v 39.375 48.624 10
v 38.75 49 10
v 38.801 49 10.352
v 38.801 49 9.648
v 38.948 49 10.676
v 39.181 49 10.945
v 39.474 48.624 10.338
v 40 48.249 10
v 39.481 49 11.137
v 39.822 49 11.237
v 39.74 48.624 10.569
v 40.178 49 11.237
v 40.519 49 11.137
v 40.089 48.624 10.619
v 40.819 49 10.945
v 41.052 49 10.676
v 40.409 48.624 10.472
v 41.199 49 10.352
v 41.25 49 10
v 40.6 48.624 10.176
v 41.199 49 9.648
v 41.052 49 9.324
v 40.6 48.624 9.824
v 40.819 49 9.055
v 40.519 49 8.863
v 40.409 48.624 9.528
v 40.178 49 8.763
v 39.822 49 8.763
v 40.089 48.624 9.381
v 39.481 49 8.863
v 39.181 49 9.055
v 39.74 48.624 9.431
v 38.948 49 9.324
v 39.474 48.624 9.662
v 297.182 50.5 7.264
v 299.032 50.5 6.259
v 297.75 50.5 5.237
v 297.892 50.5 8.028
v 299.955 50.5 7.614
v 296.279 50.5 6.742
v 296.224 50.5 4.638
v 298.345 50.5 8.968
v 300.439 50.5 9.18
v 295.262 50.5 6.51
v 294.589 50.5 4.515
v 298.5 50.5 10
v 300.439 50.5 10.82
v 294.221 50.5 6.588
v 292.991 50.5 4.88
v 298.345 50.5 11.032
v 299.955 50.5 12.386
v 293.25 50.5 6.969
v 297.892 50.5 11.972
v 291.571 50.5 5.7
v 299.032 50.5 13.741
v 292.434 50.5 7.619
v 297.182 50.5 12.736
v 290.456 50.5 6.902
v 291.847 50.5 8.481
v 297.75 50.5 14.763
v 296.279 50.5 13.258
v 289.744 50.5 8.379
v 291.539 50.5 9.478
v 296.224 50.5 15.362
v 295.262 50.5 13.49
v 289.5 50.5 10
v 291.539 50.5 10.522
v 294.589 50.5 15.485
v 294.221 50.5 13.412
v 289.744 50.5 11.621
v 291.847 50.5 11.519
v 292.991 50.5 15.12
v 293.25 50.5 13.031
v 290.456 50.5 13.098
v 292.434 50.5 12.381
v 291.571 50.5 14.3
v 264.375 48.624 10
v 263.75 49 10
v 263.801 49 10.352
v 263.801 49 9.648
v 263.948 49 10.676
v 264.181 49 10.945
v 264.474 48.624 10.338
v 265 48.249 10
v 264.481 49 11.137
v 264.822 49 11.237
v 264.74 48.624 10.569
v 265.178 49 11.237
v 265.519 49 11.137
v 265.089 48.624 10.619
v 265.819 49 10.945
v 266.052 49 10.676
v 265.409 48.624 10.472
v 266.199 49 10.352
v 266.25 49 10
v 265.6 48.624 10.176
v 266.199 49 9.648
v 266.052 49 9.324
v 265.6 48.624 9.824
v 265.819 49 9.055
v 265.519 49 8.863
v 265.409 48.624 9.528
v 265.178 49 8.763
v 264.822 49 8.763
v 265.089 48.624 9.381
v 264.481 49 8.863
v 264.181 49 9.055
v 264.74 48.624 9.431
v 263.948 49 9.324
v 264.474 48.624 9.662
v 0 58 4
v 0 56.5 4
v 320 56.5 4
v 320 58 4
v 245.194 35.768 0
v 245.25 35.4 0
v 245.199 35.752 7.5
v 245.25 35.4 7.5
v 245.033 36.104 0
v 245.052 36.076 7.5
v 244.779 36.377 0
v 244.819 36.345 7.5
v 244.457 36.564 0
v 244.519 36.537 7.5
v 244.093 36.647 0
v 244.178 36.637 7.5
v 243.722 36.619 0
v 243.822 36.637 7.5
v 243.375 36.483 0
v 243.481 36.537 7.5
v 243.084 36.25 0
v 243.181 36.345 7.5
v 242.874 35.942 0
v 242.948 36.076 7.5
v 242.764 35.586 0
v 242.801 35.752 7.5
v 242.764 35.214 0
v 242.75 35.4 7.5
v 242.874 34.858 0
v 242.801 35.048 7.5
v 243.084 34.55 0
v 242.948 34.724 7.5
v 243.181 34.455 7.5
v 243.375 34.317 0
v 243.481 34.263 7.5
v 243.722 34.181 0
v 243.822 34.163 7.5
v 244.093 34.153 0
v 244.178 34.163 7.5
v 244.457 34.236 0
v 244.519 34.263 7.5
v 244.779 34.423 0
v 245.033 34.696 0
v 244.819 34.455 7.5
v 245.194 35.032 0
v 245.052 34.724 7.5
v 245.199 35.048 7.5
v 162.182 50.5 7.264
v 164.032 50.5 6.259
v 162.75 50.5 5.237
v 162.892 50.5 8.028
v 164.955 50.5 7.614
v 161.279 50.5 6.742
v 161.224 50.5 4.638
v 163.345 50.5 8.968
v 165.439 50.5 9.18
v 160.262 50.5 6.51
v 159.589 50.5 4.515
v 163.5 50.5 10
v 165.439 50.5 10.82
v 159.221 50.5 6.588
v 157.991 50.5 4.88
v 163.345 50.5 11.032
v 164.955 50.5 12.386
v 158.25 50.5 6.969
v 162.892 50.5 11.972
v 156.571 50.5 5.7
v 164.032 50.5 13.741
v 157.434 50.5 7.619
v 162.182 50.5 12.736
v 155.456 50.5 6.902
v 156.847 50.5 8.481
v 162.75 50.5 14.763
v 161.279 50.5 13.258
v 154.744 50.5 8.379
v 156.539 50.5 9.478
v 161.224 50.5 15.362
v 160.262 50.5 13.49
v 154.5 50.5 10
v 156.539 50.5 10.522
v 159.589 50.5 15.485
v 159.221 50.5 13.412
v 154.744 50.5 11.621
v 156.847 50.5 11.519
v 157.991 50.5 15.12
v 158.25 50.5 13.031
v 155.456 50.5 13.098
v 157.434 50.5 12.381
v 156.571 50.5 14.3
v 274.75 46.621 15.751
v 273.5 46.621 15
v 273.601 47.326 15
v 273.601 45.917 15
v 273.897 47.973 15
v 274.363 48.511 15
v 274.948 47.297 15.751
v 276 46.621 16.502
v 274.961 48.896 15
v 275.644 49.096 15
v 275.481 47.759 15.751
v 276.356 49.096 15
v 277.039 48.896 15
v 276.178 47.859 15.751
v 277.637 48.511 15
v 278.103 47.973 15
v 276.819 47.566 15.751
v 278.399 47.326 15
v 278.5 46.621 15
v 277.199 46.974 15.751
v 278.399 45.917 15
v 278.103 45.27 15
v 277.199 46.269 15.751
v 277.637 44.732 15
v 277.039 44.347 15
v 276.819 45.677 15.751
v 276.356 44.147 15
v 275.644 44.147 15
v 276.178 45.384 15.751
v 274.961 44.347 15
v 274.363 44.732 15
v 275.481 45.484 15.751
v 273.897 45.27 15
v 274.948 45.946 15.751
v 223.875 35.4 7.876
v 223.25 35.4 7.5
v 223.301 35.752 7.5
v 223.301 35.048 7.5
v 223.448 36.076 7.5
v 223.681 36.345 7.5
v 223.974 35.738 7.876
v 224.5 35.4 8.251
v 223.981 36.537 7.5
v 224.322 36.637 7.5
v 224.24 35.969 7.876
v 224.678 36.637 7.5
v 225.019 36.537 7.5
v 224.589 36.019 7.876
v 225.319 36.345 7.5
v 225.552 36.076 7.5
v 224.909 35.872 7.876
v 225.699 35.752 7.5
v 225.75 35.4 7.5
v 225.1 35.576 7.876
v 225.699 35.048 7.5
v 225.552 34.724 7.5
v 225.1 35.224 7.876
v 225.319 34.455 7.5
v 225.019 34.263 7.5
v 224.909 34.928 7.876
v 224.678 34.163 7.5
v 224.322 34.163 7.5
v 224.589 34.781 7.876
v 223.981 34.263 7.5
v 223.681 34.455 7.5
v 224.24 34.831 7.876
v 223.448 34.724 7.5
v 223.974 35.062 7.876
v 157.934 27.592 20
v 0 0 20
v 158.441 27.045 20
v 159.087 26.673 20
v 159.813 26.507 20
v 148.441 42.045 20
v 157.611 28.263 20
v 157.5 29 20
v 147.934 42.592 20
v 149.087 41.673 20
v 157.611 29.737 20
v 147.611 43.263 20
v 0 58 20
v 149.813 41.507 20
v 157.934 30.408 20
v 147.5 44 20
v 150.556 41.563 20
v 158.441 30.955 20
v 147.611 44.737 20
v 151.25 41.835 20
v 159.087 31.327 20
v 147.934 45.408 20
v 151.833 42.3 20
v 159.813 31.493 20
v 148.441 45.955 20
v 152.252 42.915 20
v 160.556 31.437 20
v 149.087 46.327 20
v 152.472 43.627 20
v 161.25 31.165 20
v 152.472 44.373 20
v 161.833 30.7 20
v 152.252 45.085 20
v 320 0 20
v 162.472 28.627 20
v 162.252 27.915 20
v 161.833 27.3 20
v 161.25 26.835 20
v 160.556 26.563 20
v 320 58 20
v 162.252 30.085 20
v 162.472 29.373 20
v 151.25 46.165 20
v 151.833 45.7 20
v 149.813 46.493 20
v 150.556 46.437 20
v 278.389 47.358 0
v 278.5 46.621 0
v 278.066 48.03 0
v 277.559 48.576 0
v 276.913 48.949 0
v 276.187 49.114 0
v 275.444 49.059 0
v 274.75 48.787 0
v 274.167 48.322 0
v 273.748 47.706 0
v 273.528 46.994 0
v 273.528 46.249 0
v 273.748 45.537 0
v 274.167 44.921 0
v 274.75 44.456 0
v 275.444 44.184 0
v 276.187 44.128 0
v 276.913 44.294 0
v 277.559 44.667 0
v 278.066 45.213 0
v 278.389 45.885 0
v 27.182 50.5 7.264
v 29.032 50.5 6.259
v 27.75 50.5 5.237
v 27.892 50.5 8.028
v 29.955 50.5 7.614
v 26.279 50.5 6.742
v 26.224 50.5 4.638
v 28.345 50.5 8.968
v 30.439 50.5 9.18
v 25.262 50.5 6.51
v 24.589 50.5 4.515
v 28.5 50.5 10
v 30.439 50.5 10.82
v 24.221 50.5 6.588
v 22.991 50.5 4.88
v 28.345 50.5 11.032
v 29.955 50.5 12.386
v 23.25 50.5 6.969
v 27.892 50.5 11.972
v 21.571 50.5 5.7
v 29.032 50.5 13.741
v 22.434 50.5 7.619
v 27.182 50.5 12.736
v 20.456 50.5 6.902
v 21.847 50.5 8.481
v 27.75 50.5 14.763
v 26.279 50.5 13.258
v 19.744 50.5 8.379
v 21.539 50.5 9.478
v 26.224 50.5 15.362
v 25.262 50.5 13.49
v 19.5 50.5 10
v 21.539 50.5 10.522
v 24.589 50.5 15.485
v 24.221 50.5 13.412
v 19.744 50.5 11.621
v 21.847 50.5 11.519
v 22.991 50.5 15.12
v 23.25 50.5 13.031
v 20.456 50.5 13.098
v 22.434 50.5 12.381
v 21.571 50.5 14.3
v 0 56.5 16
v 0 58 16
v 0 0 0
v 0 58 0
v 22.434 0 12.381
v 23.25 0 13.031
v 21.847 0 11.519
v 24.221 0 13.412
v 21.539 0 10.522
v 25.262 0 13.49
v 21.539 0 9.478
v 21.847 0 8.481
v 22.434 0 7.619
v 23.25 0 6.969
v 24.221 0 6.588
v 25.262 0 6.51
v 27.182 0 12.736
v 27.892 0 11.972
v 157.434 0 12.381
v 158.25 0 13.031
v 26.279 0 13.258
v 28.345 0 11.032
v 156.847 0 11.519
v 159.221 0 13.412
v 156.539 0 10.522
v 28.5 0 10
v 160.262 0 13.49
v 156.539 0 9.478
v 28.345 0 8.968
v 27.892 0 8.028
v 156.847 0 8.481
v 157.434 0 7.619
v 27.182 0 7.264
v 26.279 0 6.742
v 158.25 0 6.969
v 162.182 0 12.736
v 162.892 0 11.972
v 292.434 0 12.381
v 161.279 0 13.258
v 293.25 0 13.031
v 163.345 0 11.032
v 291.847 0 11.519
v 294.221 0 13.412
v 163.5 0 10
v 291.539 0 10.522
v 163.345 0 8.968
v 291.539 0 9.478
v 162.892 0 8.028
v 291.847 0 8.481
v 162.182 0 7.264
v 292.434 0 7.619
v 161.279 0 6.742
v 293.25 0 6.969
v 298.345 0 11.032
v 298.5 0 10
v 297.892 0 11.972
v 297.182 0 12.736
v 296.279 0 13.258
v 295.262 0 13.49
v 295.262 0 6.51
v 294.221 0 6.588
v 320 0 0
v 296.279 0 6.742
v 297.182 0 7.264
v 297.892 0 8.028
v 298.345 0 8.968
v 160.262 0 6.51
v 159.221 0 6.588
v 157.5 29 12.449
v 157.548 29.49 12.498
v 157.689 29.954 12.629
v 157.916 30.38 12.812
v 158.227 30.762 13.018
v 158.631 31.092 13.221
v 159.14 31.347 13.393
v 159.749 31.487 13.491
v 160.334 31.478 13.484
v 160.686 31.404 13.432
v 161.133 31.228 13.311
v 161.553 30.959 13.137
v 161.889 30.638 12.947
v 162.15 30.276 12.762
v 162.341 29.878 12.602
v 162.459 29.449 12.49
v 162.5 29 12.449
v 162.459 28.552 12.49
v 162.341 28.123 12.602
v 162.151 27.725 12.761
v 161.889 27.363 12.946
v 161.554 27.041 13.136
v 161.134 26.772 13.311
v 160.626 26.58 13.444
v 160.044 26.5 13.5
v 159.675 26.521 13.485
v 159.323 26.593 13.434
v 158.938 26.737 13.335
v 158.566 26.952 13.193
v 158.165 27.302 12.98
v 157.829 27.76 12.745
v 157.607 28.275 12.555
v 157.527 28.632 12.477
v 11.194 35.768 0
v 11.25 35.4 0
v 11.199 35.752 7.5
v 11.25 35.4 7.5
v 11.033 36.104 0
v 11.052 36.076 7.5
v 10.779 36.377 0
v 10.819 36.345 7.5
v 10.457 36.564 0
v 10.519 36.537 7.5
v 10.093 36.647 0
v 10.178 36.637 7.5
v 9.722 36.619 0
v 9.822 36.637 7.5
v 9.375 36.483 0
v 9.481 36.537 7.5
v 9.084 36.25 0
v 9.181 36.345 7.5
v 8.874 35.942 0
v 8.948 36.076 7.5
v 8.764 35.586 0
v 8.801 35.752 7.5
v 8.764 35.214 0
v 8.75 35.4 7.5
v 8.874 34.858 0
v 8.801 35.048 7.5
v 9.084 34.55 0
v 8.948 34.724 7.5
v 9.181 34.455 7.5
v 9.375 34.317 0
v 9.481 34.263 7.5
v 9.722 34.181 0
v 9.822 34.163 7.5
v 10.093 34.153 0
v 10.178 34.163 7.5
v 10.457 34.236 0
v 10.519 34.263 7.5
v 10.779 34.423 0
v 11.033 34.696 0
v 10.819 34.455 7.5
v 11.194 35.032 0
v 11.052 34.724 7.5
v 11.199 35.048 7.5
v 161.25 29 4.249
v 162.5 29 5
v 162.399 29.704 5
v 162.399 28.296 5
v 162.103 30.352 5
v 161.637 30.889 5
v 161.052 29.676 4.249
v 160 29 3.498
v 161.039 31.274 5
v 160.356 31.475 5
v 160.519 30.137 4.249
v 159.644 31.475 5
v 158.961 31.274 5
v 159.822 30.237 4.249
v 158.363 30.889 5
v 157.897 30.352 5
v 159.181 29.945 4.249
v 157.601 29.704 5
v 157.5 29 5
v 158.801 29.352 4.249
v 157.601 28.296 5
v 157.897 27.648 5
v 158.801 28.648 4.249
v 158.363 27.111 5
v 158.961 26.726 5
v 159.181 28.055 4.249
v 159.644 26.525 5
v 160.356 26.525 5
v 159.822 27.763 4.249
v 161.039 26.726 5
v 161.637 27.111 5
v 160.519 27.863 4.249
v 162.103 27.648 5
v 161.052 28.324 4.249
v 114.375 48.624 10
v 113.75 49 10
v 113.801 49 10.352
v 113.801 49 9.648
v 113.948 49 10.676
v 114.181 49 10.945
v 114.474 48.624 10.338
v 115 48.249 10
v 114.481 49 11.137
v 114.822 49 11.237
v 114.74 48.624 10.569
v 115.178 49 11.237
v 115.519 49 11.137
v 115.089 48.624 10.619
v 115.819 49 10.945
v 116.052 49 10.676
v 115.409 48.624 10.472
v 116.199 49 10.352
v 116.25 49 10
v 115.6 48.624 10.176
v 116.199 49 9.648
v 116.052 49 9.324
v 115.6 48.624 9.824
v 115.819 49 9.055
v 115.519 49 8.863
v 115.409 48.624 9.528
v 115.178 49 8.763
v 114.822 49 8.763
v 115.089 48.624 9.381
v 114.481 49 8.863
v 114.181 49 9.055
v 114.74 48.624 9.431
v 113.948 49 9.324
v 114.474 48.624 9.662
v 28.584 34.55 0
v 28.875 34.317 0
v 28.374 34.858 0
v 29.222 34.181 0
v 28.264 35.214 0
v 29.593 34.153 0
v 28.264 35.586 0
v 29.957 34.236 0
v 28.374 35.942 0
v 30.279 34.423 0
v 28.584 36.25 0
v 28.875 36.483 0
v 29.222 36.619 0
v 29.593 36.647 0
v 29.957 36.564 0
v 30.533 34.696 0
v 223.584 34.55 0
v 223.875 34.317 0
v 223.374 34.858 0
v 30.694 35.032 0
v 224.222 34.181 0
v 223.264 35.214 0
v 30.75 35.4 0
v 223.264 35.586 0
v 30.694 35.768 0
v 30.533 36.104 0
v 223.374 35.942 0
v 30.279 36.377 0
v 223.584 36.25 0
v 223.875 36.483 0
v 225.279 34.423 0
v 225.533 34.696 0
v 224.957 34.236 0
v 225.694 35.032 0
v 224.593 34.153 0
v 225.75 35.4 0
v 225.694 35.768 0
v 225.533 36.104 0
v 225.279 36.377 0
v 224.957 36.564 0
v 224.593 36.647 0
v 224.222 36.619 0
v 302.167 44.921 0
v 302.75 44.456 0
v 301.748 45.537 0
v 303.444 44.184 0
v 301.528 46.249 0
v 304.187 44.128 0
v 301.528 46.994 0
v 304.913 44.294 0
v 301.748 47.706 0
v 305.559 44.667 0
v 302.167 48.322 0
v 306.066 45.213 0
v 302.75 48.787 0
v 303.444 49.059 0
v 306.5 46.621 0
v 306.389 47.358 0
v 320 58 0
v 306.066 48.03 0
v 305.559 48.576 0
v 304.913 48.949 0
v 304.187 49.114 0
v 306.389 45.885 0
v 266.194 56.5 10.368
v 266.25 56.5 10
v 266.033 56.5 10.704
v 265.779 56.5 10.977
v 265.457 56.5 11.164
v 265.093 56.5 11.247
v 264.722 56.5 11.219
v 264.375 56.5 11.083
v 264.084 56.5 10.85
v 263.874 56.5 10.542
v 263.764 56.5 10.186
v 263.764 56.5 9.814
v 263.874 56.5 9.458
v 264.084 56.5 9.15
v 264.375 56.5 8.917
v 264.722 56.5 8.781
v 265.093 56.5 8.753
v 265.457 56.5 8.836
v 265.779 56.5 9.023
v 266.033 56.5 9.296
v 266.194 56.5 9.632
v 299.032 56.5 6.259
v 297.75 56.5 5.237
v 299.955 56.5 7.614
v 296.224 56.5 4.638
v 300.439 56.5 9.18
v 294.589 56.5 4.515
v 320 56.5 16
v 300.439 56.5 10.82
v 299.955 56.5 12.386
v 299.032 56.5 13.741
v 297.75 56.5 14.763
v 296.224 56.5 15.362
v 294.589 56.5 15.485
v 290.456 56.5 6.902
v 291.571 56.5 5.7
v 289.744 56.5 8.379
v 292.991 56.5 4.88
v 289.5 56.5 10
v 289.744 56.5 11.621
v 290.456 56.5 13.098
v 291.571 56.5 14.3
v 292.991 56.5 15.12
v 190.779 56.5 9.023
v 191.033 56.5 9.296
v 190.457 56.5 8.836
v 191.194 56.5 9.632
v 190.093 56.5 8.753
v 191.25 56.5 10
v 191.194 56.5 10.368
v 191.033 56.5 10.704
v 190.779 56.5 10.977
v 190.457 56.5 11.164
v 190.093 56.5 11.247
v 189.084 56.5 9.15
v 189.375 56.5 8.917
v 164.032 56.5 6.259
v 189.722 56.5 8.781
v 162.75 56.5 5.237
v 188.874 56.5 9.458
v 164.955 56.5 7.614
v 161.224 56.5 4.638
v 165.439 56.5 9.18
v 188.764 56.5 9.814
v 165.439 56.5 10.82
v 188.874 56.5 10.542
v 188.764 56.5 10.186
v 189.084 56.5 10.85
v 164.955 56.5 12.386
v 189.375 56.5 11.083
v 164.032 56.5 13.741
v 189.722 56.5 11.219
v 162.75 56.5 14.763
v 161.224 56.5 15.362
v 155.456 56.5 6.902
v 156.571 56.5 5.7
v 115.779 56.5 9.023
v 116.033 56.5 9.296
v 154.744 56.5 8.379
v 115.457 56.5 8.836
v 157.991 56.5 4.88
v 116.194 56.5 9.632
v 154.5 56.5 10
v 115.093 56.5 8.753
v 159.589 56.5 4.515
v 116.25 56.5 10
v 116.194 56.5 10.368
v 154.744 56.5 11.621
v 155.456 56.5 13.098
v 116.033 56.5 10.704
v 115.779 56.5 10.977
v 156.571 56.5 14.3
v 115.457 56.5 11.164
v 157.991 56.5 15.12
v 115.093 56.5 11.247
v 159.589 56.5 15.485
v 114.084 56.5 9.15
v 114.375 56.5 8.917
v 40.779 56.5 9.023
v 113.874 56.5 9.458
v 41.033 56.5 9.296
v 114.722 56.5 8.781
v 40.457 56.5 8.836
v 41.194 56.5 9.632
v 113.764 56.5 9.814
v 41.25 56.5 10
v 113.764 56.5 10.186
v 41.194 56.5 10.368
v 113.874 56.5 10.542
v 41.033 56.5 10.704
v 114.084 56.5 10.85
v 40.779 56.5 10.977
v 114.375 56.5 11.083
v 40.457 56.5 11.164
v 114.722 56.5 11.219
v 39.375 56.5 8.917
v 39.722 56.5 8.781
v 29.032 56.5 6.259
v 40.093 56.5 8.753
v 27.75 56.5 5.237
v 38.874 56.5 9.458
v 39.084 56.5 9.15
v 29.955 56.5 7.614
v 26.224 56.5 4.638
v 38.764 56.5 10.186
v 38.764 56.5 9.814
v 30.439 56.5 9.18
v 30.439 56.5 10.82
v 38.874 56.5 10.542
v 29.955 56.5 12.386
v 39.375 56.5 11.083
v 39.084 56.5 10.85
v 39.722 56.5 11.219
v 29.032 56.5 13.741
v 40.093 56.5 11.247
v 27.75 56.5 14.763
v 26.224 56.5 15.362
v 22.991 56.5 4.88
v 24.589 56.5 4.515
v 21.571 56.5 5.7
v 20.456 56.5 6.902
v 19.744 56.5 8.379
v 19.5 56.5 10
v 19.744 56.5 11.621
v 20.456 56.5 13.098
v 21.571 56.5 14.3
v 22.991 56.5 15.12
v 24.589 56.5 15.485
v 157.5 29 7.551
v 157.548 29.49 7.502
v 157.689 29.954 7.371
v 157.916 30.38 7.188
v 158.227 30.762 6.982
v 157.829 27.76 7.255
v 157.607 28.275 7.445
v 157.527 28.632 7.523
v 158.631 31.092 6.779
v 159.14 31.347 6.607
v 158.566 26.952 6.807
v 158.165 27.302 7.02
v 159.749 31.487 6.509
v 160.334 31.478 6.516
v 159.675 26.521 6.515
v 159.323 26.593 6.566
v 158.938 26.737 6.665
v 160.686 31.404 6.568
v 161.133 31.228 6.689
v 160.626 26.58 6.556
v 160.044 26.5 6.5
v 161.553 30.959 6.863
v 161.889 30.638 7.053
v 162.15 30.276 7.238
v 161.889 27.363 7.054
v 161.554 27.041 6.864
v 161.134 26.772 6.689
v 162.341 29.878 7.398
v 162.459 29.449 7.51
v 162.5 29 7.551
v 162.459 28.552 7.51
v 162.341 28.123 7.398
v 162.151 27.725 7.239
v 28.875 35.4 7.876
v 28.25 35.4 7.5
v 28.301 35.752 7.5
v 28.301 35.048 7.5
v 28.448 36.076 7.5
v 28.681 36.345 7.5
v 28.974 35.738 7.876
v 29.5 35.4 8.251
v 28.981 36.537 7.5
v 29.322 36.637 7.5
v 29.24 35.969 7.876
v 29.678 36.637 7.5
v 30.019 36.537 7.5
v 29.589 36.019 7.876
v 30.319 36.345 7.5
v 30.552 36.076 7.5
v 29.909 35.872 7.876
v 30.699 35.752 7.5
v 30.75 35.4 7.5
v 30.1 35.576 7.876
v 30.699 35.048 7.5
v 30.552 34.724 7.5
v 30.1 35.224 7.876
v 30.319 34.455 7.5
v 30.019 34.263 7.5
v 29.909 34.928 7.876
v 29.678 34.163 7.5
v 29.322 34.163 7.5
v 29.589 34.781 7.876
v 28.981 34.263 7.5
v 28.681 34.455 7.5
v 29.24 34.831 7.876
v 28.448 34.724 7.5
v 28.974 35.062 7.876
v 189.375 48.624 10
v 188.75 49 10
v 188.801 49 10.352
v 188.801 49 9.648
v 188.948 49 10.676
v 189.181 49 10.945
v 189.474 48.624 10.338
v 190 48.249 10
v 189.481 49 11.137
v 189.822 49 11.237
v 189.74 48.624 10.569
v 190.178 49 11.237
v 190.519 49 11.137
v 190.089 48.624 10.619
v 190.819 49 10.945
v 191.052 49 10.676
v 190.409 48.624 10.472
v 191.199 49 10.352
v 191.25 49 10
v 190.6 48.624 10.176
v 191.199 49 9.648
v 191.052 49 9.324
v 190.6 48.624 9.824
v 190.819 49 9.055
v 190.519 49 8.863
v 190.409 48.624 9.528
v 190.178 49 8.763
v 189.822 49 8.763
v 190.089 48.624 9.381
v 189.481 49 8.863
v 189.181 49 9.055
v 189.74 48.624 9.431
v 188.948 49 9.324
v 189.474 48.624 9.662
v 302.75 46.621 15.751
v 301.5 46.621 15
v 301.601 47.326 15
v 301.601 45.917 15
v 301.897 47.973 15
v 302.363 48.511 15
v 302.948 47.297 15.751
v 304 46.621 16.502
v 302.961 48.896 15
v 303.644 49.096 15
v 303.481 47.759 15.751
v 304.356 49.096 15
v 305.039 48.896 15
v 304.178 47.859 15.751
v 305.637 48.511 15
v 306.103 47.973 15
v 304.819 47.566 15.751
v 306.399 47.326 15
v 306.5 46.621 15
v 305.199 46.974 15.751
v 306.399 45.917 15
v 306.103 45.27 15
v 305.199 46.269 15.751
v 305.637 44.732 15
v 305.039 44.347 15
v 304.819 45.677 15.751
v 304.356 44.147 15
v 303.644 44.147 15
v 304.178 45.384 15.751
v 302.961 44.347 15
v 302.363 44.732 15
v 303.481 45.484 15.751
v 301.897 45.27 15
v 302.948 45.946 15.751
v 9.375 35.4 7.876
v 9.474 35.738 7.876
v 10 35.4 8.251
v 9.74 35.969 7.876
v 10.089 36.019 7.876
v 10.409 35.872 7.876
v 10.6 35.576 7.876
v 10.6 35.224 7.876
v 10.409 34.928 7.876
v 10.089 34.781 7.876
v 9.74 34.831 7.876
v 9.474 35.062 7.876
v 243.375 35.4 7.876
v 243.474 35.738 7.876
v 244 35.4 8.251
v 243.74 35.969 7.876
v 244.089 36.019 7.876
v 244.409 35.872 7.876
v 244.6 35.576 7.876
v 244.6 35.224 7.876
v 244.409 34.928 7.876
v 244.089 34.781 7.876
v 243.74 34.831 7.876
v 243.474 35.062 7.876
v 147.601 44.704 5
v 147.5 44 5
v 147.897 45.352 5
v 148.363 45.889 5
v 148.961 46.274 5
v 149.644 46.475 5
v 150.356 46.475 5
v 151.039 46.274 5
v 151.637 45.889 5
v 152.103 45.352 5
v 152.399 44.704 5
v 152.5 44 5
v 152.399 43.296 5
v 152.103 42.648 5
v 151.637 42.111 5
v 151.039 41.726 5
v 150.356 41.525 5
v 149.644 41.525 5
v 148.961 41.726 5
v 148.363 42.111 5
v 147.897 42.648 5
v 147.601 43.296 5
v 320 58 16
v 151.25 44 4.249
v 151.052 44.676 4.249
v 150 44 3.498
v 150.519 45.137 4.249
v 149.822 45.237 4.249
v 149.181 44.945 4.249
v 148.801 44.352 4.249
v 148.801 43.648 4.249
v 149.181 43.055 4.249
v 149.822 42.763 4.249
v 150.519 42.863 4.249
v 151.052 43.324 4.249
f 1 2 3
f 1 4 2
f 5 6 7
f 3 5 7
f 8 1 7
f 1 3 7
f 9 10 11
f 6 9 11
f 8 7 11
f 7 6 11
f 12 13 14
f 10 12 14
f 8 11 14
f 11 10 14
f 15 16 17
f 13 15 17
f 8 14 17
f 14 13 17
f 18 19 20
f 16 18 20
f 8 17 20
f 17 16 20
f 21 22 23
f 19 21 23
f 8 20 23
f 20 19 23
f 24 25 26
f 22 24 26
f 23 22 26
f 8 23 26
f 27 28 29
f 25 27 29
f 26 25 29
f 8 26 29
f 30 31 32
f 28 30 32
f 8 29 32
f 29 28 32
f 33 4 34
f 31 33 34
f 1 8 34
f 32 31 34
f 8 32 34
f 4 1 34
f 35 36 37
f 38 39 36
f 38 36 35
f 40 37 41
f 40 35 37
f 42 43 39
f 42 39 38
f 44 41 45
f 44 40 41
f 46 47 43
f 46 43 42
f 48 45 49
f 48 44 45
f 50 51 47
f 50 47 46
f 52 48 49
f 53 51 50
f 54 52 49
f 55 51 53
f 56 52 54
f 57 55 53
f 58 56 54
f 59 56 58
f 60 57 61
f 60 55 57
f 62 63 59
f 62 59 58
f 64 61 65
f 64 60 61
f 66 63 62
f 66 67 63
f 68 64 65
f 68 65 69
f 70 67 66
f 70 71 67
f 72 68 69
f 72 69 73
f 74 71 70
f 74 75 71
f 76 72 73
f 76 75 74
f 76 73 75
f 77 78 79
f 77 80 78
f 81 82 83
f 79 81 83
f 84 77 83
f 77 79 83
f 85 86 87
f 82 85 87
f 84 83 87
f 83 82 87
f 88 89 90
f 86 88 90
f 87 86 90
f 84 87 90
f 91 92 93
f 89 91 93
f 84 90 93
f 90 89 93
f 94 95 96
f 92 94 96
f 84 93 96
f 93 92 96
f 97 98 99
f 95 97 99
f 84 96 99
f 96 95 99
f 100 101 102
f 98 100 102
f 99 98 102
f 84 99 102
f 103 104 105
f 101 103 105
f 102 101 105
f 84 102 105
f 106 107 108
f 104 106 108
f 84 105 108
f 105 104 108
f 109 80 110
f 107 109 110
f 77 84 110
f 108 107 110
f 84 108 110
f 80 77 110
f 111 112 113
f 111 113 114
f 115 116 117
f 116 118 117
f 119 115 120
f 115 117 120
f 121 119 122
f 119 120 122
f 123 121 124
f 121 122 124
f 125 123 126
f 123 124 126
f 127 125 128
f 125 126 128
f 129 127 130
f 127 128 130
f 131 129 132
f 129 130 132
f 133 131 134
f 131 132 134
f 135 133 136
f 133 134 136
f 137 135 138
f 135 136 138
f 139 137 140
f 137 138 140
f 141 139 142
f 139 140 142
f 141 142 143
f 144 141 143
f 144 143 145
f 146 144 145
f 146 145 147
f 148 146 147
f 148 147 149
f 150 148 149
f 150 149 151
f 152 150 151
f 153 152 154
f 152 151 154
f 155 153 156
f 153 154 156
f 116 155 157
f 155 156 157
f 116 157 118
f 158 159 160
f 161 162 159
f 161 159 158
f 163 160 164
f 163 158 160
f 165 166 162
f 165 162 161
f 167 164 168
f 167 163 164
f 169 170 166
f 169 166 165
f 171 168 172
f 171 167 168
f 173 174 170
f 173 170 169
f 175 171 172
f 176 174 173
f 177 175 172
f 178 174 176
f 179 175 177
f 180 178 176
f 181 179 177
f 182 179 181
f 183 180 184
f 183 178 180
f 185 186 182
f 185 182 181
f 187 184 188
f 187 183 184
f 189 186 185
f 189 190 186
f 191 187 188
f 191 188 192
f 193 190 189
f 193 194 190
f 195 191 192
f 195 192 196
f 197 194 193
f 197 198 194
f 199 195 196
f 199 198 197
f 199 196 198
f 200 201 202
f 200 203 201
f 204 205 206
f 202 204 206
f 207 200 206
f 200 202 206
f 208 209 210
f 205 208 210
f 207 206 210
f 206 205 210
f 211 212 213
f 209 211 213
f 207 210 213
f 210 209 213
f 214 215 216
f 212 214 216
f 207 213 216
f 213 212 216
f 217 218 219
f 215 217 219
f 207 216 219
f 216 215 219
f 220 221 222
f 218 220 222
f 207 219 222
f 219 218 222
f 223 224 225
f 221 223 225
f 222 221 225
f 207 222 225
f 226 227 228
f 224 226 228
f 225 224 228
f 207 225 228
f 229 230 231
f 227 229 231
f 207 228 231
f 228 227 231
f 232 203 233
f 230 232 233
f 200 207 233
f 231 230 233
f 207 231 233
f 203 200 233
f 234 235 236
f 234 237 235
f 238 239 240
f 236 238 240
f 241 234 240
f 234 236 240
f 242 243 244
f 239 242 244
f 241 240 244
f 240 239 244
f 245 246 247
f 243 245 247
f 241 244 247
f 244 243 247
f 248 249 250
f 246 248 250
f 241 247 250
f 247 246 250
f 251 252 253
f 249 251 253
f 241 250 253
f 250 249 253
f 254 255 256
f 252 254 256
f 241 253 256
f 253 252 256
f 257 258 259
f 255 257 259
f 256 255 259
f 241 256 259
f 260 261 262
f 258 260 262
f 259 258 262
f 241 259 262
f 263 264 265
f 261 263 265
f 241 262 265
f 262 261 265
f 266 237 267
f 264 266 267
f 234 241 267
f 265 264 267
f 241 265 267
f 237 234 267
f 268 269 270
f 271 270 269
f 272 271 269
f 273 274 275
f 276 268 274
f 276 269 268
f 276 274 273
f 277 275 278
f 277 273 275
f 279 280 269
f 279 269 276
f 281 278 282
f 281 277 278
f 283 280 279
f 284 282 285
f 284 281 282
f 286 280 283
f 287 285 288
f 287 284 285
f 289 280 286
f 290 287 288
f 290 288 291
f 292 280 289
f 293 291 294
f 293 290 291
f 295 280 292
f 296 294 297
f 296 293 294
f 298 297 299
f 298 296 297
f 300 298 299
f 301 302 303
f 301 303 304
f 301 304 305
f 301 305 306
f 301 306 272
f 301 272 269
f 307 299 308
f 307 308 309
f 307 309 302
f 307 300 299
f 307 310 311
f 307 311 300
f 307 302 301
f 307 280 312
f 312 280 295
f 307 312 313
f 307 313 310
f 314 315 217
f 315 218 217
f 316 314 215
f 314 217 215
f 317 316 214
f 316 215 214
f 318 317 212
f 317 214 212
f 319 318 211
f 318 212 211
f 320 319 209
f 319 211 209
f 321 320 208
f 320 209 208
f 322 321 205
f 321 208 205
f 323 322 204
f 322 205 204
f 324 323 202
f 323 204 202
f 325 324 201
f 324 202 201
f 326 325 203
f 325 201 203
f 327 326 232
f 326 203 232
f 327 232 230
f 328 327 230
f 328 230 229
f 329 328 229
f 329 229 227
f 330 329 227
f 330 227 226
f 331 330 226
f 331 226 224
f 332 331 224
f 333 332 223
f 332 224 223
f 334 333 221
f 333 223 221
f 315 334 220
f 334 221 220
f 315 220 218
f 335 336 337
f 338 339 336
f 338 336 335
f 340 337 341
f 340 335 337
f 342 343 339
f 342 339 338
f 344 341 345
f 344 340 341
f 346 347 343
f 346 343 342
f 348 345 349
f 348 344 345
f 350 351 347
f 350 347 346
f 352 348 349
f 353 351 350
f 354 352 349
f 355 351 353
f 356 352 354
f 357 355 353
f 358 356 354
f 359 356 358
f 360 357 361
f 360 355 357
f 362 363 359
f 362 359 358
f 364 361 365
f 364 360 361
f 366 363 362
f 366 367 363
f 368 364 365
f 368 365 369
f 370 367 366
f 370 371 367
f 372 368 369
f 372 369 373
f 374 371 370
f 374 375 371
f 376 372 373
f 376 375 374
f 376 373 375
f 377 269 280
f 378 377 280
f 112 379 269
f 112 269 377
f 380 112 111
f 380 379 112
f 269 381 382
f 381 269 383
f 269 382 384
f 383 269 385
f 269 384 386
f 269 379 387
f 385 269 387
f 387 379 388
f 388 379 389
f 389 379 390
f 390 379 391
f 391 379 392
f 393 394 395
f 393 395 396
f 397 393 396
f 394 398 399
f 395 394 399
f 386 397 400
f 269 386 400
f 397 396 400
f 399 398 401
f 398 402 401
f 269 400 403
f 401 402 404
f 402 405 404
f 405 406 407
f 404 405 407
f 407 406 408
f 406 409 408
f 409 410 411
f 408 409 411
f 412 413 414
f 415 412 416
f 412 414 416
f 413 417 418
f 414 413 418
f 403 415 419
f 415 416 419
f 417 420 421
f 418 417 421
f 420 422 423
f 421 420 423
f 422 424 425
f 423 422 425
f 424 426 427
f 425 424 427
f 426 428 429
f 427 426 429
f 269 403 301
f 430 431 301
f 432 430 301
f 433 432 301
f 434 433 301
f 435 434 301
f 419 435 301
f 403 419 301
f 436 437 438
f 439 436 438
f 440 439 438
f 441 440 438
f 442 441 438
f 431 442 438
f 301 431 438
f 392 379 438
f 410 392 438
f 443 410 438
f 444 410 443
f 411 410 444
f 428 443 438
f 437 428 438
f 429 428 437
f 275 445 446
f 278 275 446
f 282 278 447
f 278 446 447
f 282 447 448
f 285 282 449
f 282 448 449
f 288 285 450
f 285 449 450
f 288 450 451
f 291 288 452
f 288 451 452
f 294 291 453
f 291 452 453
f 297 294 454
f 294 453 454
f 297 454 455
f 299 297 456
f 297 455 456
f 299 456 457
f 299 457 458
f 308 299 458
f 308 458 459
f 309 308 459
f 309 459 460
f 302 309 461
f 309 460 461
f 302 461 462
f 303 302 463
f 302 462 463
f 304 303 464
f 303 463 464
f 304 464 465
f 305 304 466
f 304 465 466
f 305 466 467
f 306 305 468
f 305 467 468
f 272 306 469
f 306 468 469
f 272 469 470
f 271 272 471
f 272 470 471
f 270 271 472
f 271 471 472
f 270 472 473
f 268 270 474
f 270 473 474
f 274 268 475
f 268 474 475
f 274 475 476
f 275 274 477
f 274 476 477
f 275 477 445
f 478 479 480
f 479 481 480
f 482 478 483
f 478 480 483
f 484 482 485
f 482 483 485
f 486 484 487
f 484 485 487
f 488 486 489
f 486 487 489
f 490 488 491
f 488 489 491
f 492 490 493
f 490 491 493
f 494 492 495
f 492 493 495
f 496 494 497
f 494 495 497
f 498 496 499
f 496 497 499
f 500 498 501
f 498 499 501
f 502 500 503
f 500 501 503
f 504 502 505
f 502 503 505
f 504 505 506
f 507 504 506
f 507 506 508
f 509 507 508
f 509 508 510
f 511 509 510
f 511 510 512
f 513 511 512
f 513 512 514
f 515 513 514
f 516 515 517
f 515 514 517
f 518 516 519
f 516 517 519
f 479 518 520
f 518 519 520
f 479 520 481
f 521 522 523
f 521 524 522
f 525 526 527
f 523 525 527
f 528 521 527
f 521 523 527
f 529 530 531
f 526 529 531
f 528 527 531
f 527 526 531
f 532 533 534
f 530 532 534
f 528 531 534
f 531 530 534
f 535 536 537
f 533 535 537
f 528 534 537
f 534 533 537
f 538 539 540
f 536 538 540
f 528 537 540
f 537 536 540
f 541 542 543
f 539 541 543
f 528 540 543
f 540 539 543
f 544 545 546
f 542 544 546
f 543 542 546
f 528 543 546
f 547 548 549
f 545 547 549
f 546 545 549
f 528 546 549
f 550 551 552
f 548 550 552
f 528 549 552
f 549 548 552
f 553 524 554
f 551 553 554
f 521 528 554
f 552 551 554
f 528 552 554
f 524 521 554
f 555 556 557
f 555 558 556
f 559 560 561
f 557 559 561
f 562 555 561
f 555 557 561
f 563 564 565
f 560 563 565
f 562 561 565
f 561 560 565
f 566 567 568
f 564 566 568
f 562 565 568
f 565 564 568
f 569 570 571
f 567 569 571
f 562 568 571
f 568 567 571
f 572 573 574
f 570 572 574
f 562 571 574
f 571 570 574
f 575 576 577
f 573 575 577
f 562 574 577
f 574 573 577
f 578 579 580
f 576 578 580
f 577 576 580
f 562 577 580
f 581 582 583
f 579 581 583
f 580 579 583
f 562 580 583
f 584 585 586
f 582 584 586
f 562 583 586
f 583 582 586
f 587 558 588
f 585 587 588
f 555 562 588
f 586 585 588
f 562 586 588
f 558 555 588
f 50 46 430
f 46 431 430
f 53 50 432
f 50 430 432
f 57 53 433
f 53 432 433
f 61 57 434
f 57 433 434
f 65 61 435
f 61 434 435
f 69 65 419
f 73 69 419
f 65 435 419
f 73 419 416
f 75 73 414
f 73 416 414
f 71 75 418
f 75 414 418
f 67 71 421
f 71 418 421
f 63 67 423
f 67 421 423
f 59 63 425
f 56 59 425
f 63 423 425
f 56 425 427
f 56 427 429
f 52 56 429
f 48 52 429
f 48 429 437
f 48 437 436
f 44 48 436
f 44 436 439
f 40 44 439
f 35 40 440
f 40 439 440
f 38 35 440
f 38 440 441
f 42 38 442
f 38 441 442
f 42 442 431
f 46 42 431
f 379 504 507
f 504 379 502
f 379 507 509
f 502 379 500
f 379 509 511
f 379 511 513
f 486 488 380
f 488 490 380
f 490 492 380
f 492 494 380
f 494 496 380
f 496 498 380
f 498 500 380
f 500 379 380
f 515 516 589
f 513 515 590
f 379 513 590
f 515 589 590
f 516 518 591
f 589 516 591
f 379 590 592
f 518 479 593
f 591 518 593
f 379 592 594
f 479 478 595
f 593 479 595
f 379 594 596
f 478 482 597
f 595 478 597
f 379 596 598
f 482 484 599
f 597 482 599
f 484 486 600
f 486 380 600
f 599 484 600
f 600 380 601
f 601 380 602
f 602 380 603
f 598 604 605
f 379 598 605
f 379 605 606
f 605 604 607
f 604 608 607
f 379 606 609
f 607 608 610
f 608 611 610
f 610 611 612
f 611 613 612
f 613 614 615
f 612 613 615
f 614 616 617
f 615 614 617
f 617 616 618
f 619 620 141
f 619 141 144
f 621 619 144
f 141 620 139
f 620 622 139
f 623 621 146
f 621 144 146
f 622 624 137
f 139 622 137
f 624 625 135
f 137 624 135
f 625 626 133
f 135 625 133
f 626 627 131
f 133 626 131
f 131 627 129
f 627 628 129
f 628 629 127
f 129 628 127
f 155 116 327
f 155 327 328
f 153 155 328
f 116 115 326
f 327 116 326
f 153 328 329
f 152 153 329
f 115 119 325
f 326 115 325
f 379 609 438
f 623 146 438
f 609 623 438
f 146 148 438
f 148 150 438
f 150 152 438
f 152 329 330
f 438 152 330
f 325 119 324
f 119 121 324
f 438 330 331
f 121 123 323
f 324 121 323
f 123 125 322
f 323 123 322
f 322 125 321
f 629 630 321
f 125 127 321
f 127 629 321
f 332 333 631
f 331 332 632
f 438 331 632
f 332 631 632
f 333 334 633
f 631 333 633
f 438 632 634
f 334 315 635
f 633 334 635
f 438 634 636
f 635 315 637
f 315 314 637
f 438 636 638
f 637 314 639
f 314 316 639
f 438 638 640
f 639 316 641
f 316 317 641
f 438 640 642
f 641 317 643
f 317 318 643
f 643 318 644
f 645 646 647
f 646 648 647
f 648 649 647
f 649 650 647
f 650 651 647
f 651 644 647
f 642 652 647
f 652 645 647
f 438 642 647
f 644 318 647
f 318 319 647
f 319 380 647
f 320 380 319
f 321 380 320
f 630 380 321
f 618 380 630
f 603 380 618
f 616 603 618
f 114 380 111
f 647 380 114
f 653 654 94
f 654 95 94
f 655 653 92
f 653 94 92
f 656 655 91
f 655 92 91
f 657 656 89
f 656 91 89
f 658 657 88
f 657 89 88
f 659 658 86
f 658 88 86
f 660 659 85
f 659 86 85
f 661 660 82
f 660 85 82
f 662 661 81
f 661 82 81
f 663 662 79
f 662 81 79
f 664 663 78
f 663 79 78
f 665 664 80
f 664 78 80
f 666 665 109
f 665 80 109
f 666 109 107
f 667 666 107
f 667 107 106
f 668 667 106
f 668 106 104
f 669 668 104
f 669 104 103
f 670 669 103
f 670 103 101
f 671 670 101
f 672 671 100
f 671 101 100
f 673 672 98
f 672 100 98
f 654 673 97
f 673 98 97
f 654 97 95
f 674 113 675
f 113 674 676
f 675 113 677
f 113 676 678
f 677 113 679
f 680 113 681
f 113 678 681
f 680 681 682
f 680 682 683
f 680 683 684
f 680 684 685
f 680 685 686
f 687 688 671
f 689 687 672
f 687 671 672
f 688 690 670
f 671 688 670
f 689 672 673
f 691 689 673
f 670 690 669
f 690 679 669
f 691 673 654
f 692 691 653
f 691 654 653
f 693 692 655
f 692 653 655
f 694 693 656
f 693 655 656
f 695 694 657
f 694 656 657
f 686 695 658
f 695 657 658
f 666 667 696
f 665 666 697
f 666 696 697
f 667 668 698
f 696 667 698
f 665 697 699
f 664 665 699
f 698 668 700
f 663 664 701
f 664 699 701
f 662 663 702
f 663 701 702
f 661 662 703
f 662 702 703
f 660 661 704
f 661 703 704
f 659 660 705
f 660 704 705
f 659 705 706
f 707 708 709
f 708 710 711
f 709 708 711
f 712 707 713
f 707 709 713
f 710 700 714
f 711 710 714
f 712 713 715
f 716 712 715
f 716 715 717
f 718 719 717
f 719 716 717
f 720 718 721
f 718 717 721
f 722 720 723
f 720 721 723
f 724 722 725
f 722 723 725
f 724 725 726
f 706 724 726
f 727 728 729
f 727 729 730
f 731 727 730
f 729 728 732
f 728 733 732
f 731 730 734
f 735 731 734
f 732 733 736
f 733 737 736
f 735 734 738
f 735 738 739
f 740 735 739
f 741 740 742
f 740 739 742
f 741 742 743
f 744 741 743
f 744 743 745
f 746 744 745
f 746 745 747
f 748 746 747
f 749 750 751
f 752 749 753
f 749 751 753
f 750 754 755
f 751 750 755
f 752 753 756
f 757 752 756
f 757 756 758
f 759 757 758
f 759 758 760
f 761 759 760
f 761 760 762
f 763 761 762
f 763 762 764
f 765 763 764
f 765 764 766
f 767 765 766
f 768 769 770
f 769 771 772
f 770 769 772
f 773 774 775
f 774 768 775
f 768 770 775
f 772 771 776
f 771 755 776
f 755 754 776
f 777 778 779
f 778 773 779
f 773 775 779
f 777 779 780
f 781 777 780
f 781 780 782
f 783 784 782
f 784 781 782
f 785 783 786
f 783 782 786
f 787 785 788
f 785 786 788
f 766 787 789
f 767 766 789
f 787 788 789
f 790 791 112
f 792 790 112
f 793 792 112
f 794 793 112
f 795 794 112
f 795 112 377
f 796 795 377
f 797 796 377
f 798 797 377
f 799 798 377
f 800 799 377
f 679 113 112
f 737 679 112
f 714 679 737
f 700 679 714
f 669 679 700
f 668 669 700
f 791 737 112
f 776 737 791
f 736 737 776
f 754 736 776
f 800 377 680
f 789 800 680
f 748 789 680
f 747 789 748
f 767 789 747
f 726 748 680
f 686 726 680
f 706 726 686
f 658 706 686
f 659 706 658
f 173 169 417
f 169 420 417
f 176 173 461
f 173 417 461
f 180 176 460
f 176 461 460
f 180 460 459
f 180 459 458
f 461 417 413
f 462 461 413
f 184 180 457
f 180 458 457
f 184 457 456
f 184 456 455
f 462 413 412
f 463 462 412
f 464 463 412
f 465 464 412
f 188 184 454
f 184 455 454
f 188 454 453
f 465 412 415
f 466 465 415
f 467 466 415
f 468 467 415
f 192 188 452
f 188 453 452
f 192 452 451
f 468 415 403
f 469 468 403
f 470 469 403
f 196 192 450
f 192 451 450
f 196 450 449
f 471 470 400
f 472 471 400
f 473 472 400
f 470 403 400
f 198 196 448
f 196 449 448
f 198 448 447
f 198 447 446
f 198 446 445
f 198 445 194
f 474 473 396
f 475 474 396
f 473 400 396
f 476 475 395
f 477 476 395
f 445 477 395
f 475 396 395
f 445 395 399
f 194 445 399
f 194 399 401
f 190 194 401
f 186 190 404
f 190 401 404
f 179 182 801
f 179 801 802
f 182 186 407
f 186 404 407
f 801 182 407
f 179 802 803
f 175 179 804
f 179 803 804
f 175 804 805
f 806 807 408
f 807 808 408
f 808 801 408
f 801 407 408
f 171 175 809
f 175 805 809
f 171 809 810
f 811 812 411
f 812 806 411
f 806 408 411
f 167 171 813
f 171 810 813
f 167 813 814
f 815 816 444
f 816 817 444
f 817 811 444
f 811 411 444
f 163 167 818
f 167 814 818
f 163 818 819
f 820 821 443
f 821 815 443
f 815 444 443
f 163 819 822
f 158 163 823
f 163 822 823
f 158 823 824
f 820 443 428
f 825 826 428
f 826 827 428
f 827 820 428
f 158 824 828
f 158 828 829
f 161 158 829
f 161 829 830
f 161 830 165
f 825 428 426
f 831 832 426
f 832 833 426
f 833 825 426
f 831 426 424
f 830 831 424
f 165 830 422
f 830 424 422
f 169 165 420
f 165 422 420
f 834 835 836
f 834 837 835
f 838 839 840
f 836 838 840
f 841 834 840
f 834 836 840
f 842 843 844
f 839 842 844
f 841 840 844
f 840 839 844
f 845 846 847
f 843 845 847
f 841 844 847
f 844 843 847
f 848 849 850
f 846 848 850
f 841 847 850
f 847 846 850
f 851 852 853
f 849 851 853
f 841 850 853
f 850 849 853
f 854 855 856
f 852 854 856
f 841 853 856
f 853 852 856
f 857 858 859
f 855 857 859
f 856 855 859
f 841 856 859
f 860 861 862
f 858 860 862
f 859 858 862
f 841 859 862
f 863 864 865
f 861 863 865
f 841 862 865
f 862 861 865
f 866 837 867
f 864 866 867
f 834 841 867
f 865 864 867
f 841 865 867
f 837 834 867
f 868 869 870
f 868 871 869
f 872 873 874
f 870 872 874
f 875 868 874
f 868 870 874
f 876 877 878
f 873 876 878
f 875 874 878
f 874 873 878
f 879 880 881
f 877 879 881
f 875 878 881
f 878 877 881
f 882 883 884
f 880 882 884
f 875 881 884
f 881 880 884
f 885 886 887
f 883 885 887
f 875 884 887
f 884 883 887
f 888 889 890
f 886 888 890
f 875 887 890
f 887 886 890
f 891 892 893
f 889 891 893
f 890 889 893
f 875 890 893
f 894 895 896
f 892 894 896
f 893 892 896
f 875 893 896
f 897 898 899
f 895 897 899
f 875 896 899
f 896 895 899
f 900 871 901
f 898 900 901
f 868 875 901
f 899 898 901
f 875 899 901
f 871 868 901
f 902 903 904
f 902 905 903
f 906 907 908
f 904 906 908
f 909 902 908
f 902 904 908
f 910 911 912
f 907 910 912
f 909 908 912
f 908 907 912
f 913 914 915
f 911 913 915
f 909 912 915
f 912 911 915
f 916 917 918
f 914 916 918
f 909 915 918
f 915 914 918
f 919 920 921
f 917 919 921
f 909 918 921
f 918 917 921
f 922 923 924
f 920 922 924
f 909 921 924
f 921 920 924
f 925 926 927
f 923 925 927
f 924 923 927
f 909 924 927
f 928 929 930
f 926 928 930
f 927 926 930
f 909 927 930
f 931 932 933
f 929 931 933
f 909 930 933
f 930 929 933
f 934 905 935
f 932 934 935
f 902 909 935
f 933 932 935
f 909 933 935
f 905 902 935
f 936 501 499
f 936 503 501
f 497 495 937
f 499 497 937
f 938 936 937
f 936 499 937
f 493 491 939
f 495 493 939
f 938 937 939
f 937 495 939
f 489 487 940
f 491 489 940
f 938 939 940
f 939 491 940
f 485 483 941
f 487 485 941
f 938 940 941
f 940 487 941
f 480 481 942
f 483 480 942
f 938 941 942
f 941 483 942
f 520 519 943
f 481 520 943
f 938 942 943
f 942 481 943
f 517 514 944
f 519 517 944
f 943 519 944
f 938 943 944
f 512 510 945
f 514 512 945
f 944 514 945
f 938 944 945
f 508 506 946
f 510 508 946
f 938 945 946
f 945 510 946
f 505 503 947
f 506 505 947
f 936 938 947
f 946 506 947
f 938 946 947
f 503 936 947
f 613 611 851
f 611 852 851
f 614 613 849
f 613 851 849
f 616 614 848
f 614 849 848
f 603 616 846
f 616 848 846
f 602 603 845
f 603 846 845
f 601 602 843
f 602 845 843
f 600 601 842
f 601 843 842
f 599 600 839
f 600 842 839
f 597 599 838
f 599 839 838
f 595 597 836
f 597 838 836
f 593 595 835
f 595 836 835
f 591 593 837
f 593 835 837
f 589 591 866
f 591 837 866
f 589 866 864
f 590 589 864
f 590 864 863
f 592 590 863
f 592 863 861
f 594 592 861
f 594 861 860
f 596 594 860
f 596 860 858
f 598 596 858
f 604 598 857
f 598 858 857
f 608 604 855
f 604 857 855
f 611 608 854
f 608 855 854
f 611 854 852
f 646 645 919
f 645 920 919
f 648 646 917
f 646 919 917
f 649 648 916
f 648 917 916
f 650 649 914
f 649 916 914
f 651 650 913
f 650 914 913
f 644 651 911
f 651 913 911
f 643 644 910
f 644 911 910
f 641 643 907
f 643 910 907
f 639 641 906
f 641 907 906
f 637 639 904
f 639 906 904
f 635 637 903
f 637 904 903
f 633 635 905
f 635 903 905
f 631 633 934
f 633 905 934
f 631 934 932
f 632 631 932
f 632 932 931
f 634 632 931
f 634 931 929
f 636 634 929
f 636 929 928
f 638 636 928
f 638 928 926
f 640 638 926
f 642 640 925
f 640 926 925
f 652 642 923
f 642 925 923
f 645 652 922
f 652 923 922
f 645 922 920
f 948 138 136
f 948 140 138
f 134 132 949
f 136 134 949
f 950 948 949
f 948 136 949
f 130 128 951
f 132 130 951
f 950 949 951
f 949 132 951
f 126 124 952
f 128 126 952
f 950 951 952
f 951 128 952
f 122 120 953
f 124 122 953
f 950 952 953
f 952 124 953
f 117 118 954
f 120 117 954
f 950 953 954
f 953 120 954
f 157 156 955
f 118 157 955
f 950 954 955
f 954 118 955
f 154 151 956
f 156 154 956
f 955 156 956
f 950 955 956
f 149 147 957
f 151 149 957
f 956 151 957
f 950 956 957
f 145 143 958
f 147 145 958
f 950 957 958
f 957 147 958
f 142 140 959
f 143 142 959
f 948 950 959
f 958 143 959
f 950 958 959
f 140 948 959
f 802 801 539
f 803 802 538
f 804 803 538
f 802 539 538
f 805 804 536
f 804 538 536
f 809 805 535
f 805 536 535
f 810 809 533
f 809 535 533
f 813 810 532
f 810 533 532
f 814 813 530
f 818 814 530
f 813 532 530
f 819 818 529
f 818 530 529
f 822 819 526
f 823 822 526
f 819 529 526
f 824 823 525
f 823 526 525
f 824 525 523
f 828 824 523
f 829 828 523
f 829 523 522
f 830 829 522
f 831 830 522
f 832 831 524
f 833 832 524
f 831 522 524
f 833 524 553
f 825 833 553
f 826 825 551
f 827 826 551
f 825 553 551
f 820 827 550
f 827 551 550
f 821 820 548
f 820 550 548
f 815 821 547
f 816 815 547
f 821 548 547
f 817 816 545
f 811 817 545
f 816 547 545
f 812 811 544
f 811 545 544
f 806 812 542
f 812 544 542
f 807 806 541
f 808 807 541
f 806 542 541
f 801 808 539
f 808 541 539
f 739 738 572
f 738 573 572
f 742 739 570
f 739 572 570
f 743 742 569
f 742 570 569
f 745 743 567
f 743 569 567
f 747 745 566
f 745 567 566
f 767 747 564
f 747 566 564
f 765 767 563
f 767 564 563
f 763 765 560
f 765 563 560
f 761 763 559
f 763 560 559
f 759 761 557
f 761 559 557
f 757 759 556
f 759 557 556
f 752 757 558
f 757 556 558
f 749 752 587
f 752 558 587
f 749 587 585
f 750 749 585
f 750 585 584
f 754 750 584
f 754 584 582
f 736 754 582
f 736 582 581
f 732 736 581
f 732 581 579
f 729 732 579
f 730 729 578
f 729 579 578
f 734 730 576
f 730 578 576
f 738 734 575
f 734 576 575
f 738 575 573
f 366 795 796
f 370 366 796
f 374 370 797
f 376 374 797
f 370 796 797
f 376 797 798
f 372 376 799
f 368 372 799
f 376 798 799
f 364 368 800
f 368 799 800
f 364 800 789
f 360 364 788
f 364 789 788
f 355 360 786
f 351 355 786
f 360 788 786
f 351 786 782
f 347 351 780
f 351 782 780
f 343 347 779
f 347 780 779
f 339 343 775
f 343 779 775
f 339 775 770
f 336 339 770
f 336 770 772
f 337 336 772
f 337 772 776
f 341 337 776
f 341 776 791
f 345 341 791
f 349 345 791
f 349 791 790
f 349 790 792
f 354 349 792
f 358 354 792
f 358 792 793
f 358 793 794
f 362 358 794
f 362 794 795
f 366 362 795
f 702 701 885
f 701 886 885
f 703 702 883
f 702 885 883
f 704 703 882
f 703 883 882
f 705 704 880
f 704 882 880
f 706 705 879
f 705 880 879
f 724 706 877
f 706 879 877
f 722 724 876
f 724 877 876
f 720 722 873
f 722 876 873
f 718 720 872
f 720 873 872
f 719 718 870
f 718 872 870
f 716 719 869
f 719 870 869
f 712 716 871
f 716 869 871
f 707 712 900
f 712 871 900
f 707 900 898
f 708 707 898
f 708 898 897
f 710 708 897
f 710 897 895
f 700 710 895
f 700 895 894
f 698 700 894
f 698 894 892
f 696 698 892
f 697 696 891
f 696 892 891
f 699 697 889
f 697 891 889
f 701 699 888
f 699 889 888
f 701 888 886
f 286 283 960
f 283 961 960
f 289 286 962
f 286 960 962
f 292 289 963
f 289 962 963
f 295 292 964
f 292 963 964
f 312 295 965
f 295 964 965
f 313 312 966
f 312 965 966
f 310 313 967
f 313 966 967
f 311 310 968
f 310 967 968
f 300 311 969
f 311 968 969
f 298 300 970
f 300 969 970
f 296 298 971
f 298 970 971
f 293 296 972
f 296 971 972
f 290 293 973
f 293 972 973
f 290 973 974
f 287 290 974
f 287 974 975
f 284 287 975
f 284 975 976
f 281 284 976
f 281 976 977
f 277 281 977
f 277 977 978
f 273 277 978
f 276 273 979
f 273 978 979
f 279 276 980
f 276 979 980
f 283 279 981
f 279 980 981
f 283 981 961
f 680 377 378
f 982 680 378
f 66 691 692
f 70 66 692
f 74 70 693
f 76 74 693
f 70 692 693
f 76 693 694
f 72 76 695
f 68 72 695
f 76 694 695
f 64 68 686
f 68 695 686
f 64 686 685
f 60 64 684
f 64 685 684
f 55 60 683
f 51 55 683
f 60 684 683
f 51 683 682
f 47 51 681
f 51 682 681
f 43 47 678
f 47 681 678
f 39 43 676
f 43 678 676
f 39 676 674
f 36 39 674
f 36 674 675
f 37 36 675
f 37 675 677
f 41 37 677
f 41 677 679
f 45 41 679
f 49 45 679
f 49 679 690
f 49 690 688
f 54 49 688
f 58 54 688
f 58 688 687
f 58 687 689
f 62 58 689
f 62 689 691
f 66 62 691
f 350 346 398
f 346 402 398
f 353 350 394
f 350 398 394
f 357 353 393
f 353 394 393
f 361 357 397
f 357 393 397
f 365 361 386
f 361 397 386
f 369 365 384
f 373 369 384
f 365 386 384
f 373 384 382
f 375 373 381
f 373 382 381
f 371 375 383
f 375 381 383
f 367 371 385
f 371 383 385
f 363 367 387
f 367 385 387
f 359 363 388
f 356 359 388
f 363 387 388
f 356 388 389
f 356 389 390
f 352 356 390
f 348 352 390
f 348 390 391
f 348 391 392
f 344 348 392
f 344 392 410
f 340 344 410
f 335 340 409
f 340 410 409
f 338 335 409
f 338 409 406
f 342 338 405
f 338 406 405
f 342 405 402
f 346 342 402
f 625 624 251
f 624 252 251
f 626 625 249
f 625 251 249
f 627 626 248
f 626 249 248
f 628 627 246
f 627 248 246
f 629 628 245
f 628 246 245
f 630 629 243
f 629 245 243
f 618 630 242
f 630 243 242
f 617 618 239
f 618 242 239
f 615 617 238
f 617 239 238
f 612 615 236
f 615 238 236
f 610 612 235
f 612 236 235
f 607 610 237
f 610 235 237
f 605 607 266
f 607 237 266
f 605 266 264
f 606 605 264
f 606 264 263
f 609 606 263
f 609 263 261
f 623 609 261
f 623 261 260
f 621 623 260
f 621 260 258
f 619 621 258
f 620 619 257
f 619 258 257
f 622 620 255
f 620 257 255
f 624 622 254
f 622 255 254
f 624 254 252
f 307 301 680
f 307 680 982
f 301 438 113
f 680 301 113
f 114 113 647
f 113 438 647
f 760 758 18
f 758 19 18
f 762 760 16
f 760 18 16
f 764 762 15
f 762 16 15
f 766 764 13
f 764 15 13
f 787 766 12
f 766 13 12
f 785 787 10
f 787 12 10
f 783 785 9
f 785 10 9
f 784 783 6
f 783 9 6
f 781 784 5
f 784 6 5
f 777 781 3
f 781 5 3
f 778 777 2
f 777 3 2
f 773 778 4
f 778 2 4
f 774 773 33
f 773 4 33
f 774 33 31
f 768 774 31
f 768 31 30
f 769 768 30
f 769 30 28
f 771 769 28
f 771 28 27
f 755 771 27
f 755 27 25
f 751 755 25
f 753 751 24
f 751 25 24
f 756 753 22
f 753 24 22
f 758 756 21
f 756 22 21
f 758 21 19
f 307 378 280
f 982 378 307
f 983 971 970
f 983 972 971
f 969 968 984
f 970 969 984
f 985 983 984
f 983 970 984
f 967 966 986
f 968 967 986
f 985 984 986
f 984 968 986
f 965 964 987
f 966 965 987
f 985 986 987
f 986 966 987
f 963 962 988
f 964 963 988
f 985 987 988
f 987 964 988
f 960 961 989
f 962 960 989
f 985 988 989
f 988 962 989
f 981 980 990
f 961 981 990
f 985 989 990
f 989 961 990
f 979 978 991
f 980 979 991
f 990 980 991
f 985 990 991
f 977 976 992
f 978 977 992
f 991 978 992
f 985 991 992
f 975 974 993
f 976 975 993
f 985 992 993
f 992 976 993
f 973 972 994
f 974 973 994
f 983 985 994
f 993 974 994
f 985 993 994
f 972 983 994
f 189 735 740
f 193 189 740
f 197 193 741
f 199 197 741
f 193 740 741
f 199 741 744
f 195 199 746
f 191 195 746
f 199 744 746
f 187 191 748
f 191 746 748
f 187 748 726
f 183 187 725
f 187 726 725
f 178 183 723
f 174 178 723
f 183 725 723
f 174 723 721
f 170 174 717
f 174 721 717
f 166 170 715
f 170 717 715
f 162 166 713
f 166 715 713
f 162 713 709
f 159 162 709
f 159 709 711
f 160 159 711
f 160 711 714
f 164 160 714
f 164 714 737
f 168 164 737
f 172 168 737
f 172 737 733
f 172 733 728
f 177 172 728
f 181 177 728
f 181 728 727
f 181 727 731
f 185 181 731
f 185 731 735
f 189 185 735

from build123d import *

# Parameters (mm, degrees)
SKETCH_1_W                     = 320
SKETCH_1_H                     = 58
EXTRUDE_1_DEPTH                = 20
SKETCH_2_W                     = 12
SKETCH_2_H                     = 1.5
CUT_EXTRUDE_1_DEPTH            = 326.828175577
HOLE_WIZARD_M6_1_D             = 5
HOLE_WIZARD_M6_1_DEPTH         = 15
HOLE_WIZARD_M6_1_TIP           = 1.502151548
HOLE_WIZARD_M6_1_2_D           = 7
HOLE_WIZARD_M6_1_2_CBORE_D     = 11
HOLE_WIZARD_M6_1_2_CBORE_DEPTH = 6
HOLE_WIZARD_M3_1_D             = 2.5
HOLE_WIZARD_M3_1_DEPTH         = 7.5
HOLE_WIZARD_M3_1_TIP           = 0.751075774
HOLE_WIZARD_M6_2_D             = 5
HOLE_WIZARD_M6_2_DEPTH         = 15
HOLE_WIZARD_M6_2_TIP           = 1.502151548
HOLE_WIZARD_M3_2_D             = 2.5
HOLE_WIZARD_M3_2_DEPTH         = 7.5
HOLE_WIZARD_M3_2_TIP           = 0.751075774


with BuildPart() as part:
    # 草图1 → 凸台-拉伸1 (new body)
    with BuildSketch(Plane.XY):
        with Locations((160, 29)):
            Rectangle(SKETCH_1_W, SKETCH_1_H)
    extrude(amount=EXTRUDE_1_DEPTH)

    # 草图2 → 切除-拉伸1 (cut, through all)
    with BuildSketch(Plane.ZY):
        with Locations((10, 57.25)):
            Rectangle(SKETCH_2_W, SKETCH_2_H)
    extrude(amount=-CUT_EXTRUDE_1_DEPTH, mode=Mode.SUBTRACT)

    # Hole Wizard M6 _1
    with Locations(Plane.XY.offset(20)):
        with Locations((160, 29), (150, 44)):
            Hole(HOLE_WIZARD_M6_1_D / 2, depth=HOLE_WIZARD_M6_1_DEPTH)
            with Locations((0, 0, -(HOLE_WIZARD_M6_1_DEPTH + HOLE_WIZARD_M6_1_TIP / 2))):  # 118° drill point
                Cone(0, HOLE_WIZARD_M6_1_D / 2, HOLE_WIZARD_M6_1_TIP, mode=Mode.SUBTRACT)

    # Hole Wizard M6 _1 2 (through all)
    with Locations(Plane(origin=(0, 56.5, 0), x_dir=(-1, 0, 0), z_dir=(0, 1, 0))):
        with Locations((-25, 10), (-295, 10), (-160, 10)):
            CounterBoreHole(HOLE_WIZARD_M6_1_2_D / 2, HOLE_WIZARD_M6_1_2_CBORE_D / 2, HOLE_WIZARD_M6_1_2_CBORE_DEPTH)

    # M3 螺纹孔1
    with Locations(Plane(origin=(0, 56.5, 0), x_dir=(-1, 0, 0), z_dir=(0, 1, 0))):
        with Locations((-265, 10), (-40, 10), (-190, 10), (-115, 10)):
            Hole(HOLE_WIZARD_M3_1_D / 2, depth=HOLE_WIZARD_M3_1_DEPTH)
            with Locations((0, 0, -(HOLE_WIZARD_M3_1_DEPTH + HOLE_WIZARD_M3_1_TIP / 2))):  # 118° drill point
                Cone(0, HOLE_WIZARD_M3_1_D / 2, HOLE_WIZARD_M3_1_TIP, mode=Mode.SUBTRACT)

    # M6 螺纹孔2
    with Locations(Plane(origin=(0, 0, 0), x_dir=(-1, 0, 0), z_dir=(0, 0, -1))):
        with Locations((-304, 46.621481833), (-276, 46.621481833)):
            Hole(HOLE_WIZARD_M6_2_D / 2, depth=HOLE_WIZARD_M6_2_DEPTH)
            with Locations((0, 0, -(HOLE_WIZARD_M6_2_DEPTH + HOLE_WIZARD_M6_2_TIP / 2))):  # 118° drill point
                Cone(0, HOLE_WIZARD_M6_2_D / 2, HOLE_WIZARD_M6_2_TIP, mode=Mode.SUBTRACT)

    # M3 螺纹孔2
    with Locations(Plane(origin=(0, 0, 0), x_dir=(-1, 0, 0), z_dir=(0, 0, -1))):
        with Locations((-10, 35.4), (-29.5, 35.4), (-244, 35.4), (-224.5, 35.4)):
            Hole(HOLE_WIZARD_M3_2_D / 2, depth=HOLE_WIZARD_M3_2_DEPTH)
            with Locations((0, 0, -(HOLE_WIZARD_M3_2_DEPTH + HOLE_WIZARD_M3_2_TIP / 2))):  # 118° drill point
                Cone(0, HOLE_WIZARD_M3_2_D / 2, HOLE_WIZARD_M3_2_TIP, mode=Mode.SUBTRACT)


solid = part.part
